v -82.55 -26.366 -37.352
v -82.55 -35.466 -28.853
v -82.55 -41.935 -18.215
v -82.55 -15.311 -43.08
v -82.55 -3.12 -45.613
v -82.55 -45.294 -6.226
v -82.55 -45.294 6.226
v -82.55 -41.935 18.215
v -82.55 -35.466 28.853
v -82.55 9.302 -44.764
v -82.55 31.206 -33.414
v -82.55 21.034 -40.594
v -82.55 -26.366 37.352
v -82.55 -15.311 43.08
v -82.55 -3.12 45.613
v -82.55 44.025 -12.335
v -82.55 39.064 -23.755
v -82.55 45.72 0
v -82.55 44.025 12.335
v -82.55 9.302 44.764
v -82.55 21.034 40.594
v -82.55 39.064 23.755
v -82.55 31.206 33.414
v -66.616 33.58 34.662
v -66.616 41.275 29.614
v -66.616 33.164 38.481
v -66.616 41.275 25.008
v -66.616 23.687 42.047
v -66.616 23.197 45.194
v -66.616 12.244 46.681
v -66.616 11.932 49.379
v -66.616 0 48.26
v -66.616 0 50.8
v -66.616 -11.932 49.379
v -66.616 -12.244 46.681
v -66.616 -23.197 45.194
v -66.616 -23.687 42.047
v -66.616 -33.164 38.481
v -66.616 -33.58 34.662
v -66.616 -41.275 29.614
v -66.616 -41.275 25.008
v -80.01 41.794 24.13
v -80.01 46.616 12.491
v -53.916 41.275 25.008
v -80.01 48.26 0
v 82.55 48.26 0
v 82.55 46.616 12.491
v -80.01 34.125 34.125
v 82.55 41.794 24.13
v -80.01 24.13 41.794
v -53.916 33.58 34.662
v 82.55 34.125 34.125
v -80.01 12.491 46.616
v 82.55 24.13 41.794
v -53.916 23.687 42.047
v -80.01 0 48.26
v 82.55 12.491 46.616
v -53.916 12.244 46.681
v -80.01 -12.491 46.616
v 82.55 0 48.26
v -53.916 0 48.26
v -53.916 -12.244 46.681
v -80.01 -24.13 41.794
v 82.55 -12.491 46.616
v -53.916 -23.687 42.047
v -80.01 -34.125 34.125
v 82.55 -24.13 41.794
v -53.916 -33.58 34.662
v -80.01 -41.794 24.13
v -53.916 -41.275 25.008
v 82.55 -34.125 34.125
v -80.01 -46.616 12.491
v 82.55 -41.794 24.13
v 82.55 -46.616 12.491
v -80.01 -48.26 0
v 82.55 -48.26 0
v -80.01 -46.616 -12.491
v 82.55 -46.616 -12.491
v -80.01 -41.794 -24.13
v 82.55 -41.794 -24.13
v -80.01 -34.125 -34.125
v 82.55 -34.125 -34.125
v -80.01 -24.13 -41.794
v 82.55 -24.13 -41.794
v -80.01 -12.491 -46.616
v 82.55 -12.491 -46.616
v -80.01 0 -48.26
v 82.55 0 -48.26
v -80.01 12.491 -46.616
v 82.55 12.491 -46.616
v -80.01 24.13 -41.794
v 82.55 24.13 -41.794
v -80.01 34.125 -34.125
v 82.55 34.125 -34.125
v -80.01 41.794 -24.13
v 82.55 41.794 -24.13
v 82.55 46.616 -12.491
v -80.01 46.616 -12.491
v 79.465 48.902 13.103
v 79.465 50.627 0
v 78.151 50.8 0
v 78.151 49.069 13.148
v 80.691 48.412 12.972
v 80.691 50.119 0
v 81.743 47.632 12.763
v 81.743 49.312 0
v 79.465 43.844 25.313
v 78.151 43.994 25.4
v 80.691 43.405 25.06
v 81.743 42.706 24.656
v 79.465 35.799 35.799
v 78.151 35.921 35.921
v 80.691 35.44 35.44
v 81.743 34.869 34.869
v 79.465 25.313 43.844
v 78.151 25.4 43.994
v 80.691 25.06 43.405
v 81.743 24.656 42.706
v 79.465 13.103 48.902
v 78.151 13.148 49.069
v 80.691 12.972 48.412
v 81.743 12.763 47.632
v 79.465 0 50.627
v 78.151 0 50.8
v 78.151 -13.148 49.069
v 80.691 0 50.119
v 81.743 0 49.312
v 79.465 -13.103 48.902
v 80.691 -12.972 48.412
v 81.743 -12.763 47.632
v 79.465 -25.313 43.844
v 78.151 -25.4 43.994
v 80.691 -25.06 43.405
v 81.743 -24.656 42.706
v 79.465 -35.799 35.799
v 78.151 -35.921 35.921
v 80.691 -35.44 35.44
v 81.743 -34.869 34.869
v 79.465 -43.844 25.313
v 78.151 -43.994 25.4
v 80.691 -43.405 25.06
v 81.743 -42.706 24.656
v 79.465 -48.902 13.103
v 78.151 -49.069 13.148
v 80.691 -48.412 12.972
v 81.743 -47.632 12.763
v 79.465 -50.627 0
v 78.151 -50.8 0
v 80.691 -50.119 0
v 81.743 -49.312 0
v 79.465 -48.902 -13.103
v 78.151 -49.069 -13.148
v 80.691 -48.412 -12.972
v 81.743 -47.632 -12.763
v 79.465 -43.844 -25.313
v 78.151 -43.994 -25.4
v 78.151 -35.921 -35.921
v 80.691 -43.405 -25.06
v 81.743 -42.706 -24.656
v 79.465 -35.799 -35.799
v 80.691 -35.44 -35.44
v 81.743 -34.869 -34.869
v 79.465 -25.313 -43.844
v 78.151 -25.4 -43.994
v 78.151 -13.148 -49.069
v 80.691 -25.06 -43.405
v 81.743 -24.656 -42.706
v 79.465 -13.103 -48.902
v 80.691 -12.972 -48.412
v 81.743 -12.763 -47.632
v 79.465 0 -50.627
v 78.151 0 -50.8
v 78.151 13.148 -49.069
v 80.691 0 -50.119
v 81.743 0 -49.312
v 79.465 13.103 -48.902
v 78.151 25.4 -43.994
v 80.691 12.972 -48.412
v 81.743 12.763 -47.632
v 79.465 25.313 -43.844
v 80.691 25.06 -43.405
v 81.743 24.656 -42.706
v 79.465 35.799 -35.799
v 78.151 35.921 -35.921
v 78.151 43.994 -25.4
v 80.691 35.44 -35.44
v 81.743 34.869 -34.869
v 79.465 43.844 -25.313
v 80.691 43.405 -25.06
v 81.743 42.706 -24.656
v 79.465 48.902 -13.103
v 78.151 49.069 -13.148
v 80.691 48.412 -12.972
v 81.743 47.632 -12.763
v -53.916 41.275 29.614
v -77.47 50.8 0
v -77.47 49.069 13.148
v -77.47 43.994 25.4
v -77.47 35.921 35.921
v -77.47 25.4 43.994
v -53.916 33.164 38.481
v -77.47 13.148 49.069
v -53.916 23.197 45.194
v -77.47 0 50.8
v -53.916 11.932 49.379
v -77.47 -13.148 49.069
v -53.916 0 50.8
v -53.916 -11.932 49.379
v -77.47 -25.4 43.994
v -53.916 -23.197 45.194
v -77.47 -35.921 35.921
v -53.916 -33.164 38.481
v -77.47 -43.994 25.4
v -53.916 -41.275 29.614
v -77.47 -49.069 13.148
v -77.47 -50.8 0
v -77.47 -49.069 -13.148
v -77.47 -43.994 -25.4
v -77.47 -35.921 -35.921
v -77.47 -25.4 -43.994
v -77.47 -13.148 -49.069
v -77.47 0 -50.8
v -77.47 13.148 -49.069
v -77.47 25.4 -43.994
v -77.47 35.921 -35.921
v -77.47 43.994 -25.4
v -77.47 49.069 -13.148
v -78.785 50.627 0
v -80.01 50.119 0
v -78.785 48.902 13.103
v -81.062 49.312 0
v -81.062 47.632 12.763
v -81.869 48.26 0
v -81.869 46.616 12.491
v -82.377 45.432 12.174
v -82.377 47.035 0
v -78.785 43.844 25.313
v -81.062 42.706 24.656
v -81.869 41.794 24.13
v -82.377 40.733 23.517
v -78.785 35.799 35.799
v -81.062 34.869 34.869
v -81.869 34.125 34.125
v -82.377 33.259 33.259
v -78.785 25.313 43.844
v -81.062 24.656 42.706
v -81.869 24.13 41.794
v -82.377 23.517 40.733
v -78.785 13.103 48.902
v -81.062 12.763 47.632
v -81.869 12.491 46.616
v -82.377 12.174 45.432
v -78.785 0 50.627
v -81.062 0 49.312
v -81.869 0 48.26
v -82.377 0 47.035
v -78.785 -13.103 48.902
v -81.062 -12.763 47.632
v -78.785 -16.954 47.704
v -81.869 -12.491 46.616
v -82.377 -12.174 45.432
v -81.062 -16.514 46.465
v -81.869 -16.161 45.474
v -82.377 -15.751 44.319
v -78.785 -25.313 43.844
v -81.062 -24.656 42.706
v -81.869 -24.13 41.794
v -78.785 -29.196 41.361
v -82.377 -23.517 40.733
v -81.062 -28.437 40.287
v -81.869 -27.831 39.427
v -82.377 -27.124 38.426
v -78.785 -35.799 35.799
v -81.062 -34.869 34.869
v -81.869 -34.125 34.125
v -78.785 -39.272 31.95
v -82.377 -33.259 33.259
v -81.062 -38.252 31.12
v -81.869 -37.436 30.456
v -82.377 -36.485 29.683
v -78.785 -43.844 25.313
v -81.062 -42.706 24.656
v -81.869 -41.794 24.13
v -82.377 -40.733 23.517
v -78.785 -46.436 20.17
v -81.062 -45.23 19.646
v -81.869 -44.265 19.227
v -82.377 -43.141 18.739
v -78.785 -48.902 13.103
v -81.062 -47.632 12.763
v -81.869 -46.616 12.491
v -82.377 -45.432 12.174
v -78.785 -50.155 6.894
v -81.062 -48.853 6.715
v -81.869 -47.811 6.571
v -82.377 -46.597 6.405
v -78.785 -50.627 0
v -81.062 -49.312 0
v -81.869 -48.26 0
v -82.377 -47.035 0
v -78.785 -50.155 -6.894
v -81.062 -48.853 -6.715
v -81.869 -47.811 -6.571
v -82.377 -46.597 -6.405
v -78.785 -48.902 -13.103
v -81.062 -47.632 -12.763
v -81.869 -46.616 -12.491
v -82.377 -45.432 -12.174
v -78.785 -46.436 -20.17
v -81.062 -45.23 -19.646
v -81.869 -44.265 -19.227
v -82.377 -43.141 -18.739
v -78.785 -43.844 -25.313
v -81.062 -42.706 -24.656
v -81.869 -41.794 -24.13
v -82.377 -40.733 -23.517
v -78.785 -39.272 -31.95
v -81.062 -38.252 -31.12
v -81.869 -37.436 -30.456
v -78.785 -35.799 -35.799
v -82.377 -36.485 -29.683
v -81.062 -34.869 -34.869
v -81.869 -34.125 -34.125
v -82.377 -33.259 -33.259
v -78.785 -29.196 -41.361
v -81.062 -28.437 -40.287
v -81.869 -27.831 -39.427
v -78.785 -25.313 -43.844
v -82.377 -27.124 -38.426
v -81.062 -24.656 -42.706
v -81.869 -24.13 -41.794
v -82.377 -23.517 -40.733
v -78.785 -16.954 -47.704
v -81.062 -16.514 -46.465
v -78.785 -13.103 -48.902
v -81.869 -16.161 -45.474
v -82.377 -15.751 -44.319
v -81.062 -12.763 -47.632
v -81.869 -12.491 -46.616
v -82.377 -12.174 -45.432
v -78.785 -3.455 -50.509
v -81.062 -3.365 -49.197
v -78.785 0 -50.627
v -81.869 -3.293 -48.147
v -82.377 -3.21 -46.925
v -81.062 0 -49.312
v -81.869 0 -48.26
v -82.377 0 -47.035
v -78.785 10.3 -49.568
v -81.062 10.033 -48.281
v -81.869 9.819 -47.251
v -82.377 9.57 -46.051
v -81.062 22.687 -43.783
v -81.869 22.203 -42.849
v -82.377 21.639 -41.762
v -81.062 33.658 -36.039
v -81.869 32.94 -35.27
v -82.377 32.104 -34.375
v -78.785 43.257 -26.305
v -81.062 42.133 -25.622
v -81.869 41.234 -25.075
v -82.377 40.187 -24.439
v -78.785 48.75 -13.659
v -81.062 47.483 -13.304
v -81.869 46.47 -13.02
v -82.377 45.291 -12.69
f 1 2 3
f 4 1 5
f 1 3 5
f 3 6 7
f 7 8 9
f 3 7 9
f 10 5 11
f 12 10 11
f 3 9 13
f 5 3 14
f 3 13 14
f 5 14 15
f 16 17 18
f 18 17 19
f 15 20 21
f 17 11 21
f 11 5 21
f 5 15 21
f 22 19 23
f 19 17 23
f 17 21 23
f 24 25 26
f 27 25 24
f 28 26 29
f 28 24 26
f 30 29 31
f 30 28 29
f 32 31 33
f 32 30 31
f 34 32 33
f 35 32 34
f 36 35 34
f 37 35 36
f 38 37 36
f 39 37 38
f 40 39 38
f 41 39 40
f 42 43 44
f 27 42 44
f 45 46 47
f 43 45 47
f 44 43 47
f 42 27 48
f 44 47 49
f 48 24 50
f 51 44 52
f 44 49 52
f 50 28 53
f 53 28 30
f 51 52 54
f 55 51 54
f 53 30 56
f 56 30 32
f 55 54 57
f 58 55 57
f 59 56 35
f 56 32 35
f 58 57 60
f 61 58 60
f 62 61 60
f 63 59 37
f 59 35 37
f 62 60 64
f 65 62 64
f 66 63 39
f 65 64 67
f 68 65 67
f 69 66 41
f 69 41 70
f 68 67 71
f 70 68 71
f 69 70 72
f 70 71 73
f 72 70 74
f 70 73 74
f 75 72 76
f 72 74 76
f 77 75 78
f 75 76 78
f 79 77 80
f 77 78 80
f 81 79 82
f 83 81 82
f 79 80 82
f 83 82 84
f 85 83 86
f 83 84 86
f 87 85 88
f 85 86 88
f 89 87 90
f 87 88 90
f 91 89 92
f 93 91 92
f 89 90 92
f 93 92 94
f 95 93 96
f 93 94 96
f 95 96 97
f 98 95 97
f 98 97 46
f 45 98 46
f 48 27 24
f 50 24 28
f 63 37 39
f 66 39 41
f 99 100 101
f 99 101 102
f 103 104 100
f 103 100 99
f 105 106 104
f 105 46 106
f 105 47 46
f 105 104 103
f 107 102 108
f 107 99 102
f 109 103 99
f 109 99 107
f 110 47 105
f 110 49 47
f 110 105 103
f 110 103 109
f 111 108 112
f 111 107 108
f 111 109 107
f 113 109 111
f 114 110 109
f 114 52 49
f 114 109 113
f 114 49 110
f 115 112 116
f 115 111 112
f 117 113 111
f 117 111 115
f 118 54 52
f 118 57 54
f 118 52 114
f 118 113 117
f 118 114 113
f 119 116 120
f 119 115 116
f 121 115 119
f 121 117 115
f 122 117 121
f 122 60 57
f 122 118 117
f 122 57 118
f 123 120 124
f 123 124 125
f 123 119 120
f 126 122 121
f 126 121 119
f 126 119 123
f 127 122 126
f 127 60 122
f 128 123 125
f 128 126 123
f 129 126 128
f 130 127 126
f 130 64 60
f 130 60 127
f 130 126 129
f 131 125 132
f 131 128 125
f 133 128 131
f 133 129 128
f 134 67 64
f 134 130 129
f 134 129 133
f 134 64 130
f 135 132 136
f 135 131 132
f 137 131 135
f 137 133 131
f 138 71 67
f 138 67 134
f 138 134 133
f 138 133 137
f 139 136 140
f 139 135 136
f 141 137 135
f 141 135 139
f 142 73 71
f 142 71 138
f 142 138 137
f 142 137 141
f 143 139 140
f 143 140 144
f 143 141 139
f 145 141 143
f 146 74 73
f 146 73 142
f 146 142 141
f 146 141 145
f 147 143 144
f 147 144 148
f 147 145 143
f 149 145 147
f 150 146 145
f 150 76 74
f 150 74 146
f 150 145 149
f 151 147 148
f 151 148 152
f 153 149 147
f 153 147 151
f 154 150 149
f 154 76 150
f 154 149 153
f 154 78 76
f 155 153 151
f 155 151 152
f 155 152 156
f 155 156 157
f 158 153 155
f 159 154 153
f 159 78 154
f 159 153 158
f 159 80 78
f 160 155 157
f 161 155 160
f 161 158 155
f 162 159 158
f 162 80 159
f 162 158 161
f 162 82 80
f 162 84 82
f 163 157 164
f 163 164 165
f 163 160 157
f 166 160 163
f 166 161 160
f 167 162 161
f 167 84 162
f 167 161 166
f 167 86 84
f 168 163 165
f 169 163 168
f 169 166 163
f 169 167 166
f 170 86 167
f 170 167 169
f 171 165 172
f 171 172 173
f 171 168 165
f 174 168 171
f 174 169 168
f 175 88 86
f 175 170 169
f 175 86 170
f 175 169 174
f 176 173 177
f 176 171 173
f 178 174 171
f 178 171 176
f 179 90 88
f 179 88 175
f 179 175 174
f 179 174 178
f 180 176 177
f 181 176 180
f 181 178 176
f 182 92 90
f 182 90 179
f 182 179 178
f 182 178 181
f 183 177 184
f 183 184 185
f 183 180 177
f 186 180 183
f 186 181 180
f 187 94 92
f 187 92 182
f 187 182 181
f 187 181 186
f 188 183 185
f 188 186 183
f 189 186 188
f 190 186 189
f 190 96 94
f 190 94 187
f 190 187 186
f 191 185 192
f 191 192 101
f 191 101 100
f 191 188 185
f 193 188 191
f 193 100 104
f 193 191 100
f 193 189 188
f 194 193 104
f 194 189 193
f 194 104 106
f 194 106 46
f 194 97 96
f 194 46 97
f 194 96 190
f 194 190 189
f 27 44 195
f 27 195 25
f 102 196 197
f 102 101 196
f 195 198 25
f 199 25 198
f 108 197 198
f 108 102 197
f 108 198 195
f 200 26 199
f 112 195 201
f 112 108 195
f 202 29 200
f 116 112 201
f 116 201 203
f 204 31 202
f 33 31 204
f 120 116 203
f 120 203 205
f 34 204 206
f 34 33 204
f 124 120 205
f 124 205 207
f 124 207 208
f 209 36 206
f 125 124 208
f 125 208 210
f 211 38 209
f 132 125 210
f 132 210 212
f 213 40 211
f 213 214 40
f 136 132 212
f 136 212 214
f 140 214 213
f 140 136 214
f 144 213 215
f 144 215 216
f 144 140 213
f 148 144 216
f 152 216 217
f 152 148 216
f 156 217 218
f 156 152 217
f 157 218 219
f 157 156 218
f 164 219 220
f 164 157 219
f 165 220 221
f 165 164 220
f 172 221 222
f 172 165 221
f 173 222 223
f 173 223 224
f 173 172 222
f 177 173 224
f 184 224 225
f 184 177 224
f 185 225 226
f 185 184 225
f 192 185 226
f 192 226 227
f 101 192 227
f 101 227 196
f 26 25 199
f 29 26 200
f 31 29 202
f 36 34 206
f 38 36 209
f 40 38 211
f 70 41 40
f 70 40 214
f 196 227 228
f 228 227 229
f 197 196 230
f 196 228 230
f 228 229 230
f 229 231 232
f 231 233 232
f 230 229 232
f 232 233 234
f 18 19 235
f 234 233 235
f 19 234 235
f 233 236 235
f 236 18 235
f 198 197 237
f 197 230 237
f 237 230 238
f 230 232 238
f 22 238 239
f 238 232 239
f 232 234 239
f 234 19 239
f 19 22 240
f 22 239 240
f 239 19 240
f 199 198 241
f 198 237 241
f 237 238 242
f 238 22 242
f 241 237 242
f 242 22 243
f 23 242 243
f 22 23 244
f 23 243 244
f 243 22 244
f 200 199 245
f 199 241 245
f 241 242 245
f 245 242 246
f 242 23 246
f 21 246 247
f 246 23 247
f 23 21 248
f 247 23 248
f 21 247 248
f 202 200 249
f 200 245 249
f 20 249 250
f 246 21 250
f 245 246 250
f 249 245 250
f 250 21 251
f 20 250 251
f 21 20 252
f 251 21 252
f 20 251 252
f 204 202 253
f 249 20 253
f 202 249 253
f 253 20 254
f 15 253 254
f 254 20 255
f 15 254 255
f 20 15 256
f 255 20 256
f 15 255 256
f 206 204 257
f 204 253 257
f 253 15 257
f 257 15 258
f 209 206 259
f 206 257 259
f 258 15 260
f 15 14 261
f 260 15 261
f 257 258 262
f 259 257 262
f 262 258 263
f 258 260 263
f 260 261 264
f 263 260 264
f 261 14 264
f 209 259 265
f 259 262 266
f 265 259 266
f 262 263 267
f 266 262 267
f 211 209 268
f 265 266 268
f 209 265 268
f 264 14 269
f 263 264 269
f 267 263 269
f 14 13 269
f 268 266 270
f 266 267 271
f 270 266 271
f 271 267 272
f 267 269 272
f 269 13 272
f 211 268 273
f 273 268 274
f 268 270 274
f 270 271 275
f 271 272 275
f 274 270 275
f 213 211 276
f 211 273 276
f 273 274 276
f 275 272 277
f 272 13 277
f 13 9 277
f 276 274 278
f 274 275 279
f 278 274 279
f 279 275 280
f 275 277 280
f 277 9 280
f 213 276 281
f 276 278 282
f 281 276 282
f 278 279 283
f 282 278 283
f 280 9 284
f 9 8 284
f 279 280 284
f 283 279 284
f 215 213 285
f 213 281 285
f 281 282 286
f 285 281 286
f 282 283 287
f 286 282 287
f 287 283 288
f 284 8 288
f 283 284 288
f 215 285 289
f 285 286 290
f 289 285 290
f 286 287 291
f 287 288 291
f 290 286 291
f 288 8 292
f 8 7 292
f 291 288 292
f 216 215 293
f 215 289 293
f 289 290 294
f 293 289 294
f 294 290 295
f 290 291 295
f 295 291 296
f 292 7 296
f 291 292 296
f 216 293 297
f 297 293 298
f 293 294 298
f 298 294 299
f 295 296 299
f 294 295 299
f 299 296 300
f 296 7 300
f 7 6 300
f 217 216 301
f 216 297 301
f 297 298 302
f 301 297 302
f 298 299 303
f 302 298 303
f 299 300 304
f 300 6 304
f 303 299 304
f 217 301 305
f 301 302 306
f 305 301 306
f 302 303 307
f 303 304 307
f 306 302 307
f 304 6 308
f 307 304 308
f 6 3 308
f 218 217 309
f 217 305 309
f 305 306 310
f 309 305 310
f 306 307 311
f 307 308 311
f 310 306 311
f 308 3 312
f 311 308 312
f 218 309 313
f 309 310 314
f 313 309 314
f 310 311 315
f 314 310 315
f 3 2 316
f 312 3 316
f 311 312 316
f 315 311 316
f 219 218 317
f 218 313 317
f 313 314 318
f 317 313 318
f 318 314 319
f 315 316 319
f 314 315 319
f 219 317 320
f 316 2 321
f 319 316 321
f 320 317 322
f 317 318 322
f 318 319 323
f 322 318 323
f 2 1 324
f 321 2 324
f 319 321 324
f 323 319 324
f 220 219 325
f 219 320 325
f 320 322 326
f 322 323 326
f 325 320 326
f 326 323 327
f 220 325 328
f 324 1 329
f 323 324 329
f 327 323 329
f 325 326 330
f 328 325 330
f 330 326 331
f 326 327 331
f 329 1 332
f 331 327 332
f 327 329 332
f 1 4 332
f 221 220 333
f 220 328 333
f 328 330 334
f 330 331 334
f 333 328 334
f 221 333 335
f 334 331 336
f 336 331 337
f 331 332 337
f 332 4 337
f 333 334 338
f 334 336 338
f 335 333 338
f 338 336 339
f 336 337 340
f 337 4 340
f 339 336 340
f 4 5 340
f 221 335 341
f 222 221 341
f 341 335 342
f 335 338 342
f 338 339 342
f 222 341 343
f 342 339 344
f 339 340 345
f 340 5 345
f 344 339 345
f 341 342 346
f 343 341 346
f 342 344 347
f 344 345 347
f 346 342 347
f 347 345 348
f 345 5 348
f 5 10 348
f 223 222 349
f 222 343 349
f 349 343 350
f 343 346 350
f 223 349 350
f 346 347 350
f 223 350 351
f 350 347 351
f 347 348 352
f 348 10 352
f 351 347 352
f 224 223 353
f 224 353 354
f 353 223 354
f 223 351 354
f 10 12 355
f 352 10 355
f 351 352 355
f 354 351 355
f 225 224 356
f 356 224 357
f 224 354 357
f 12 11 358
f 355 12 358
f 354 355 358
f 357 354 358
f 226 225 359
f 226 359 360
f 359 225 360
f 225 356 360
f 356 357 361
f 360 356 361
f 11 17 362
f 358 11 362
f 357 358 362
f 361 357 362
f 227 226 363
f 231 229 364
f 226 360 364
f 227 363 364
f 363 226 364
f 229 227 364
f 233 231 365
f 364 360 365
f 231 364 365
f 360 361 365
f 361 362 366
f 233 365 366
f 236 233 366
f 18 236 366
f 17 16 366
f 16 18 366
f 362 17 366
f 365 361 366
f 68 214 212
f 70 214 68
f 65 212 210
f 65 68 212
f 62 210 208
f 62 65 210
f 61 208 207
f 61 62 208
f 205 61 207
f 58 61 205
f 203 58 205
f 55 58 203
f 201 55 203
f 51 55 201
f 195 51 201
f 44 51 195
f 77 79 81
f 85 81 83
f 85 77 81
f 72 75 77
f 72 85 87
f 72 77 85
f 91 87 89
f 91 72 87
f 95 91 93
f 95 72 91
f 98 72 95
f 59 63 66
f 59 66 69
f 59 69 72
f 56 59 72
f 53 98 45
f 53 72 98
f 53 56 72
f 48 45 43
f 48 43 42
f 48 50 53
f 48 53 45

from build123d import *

# Parameters (mm, degrees)
F0_R     = 50.8
F1_DEPTH = 82.55
F2_T     = -2.54
F5_DEPTH = 152.4


# Not quite as in the source:
# - a fillet or chamfer that OpenCascade refuses, or shapes differently, is made with other operations: its cross-section is extruded or revolved along the edge and cut away or added


with BuildPart() as f1:
    # F0 (on Right) → F1 (new body, symmetric)
    with BuildSketch(Plane.YZ):
        Circle(F0_R)
    extrude(amount=F1_DEPTH, both=True)

    # F2
    f2_openings = [f1.faces().sort_by_distance(p)[0] for p in [
        (82.55, 0, 0),
    ]]
    offset(amount=F2_T, openings=f2_openings)

    # F3: fillet of radius 5.08 on 3 edges, made by hand

    # F3_s1 → F3_t2 (revolve, cut)
    with BuildSketch(Plane.XY):
        with BuildLine():
            ThreePointArc((-77.47, 50.8), (-81.0621024484, 49.3121024484), (-82.55, 45.72))
            Line((-82.55, 45.72), (-82.55, 50.8))
            Line((-82.55, 50.8), (-77.47, 50.8))
        make_face()
    revolve(axis=Axis((-82.55, 0, 0), (1, 0, 0)), mode=Mode.SUBTRACT)

    # F3_s3 → F3_t4 (revolve, cut)
    with BuildSketch(Plane.XY):
        with BuildLine():
            ThreePointArc((78.1505909488, 50.8), (80.6905909488, 50.1194090512), (82.55, 48.26))
            Line((82.55, 48.26), (82.55, 50.8))
            Line((82.55, 50.8), (78.1505909488, 50.8))
        make_face()
    revolve(axis=Axis((82.55, 0, 0), (1, 0, 0)), mode=Mode.SUBTRACT)

    # F4 (on Top) → F5 (cut)
    with BuildSketch(Plane.XY):
        Polygon((-53.9159391403, 0), (-53.9159391403, 41.275), (-66.6159391403, 41.275), (-66.6159391403, 0), (-66.6159391403, -41.275), (-53.9159391403, -41.275), align=None)
    extrude(amount=F5_DEPTH, mode=Mode.SUBTRACT)


solid = f1.part
